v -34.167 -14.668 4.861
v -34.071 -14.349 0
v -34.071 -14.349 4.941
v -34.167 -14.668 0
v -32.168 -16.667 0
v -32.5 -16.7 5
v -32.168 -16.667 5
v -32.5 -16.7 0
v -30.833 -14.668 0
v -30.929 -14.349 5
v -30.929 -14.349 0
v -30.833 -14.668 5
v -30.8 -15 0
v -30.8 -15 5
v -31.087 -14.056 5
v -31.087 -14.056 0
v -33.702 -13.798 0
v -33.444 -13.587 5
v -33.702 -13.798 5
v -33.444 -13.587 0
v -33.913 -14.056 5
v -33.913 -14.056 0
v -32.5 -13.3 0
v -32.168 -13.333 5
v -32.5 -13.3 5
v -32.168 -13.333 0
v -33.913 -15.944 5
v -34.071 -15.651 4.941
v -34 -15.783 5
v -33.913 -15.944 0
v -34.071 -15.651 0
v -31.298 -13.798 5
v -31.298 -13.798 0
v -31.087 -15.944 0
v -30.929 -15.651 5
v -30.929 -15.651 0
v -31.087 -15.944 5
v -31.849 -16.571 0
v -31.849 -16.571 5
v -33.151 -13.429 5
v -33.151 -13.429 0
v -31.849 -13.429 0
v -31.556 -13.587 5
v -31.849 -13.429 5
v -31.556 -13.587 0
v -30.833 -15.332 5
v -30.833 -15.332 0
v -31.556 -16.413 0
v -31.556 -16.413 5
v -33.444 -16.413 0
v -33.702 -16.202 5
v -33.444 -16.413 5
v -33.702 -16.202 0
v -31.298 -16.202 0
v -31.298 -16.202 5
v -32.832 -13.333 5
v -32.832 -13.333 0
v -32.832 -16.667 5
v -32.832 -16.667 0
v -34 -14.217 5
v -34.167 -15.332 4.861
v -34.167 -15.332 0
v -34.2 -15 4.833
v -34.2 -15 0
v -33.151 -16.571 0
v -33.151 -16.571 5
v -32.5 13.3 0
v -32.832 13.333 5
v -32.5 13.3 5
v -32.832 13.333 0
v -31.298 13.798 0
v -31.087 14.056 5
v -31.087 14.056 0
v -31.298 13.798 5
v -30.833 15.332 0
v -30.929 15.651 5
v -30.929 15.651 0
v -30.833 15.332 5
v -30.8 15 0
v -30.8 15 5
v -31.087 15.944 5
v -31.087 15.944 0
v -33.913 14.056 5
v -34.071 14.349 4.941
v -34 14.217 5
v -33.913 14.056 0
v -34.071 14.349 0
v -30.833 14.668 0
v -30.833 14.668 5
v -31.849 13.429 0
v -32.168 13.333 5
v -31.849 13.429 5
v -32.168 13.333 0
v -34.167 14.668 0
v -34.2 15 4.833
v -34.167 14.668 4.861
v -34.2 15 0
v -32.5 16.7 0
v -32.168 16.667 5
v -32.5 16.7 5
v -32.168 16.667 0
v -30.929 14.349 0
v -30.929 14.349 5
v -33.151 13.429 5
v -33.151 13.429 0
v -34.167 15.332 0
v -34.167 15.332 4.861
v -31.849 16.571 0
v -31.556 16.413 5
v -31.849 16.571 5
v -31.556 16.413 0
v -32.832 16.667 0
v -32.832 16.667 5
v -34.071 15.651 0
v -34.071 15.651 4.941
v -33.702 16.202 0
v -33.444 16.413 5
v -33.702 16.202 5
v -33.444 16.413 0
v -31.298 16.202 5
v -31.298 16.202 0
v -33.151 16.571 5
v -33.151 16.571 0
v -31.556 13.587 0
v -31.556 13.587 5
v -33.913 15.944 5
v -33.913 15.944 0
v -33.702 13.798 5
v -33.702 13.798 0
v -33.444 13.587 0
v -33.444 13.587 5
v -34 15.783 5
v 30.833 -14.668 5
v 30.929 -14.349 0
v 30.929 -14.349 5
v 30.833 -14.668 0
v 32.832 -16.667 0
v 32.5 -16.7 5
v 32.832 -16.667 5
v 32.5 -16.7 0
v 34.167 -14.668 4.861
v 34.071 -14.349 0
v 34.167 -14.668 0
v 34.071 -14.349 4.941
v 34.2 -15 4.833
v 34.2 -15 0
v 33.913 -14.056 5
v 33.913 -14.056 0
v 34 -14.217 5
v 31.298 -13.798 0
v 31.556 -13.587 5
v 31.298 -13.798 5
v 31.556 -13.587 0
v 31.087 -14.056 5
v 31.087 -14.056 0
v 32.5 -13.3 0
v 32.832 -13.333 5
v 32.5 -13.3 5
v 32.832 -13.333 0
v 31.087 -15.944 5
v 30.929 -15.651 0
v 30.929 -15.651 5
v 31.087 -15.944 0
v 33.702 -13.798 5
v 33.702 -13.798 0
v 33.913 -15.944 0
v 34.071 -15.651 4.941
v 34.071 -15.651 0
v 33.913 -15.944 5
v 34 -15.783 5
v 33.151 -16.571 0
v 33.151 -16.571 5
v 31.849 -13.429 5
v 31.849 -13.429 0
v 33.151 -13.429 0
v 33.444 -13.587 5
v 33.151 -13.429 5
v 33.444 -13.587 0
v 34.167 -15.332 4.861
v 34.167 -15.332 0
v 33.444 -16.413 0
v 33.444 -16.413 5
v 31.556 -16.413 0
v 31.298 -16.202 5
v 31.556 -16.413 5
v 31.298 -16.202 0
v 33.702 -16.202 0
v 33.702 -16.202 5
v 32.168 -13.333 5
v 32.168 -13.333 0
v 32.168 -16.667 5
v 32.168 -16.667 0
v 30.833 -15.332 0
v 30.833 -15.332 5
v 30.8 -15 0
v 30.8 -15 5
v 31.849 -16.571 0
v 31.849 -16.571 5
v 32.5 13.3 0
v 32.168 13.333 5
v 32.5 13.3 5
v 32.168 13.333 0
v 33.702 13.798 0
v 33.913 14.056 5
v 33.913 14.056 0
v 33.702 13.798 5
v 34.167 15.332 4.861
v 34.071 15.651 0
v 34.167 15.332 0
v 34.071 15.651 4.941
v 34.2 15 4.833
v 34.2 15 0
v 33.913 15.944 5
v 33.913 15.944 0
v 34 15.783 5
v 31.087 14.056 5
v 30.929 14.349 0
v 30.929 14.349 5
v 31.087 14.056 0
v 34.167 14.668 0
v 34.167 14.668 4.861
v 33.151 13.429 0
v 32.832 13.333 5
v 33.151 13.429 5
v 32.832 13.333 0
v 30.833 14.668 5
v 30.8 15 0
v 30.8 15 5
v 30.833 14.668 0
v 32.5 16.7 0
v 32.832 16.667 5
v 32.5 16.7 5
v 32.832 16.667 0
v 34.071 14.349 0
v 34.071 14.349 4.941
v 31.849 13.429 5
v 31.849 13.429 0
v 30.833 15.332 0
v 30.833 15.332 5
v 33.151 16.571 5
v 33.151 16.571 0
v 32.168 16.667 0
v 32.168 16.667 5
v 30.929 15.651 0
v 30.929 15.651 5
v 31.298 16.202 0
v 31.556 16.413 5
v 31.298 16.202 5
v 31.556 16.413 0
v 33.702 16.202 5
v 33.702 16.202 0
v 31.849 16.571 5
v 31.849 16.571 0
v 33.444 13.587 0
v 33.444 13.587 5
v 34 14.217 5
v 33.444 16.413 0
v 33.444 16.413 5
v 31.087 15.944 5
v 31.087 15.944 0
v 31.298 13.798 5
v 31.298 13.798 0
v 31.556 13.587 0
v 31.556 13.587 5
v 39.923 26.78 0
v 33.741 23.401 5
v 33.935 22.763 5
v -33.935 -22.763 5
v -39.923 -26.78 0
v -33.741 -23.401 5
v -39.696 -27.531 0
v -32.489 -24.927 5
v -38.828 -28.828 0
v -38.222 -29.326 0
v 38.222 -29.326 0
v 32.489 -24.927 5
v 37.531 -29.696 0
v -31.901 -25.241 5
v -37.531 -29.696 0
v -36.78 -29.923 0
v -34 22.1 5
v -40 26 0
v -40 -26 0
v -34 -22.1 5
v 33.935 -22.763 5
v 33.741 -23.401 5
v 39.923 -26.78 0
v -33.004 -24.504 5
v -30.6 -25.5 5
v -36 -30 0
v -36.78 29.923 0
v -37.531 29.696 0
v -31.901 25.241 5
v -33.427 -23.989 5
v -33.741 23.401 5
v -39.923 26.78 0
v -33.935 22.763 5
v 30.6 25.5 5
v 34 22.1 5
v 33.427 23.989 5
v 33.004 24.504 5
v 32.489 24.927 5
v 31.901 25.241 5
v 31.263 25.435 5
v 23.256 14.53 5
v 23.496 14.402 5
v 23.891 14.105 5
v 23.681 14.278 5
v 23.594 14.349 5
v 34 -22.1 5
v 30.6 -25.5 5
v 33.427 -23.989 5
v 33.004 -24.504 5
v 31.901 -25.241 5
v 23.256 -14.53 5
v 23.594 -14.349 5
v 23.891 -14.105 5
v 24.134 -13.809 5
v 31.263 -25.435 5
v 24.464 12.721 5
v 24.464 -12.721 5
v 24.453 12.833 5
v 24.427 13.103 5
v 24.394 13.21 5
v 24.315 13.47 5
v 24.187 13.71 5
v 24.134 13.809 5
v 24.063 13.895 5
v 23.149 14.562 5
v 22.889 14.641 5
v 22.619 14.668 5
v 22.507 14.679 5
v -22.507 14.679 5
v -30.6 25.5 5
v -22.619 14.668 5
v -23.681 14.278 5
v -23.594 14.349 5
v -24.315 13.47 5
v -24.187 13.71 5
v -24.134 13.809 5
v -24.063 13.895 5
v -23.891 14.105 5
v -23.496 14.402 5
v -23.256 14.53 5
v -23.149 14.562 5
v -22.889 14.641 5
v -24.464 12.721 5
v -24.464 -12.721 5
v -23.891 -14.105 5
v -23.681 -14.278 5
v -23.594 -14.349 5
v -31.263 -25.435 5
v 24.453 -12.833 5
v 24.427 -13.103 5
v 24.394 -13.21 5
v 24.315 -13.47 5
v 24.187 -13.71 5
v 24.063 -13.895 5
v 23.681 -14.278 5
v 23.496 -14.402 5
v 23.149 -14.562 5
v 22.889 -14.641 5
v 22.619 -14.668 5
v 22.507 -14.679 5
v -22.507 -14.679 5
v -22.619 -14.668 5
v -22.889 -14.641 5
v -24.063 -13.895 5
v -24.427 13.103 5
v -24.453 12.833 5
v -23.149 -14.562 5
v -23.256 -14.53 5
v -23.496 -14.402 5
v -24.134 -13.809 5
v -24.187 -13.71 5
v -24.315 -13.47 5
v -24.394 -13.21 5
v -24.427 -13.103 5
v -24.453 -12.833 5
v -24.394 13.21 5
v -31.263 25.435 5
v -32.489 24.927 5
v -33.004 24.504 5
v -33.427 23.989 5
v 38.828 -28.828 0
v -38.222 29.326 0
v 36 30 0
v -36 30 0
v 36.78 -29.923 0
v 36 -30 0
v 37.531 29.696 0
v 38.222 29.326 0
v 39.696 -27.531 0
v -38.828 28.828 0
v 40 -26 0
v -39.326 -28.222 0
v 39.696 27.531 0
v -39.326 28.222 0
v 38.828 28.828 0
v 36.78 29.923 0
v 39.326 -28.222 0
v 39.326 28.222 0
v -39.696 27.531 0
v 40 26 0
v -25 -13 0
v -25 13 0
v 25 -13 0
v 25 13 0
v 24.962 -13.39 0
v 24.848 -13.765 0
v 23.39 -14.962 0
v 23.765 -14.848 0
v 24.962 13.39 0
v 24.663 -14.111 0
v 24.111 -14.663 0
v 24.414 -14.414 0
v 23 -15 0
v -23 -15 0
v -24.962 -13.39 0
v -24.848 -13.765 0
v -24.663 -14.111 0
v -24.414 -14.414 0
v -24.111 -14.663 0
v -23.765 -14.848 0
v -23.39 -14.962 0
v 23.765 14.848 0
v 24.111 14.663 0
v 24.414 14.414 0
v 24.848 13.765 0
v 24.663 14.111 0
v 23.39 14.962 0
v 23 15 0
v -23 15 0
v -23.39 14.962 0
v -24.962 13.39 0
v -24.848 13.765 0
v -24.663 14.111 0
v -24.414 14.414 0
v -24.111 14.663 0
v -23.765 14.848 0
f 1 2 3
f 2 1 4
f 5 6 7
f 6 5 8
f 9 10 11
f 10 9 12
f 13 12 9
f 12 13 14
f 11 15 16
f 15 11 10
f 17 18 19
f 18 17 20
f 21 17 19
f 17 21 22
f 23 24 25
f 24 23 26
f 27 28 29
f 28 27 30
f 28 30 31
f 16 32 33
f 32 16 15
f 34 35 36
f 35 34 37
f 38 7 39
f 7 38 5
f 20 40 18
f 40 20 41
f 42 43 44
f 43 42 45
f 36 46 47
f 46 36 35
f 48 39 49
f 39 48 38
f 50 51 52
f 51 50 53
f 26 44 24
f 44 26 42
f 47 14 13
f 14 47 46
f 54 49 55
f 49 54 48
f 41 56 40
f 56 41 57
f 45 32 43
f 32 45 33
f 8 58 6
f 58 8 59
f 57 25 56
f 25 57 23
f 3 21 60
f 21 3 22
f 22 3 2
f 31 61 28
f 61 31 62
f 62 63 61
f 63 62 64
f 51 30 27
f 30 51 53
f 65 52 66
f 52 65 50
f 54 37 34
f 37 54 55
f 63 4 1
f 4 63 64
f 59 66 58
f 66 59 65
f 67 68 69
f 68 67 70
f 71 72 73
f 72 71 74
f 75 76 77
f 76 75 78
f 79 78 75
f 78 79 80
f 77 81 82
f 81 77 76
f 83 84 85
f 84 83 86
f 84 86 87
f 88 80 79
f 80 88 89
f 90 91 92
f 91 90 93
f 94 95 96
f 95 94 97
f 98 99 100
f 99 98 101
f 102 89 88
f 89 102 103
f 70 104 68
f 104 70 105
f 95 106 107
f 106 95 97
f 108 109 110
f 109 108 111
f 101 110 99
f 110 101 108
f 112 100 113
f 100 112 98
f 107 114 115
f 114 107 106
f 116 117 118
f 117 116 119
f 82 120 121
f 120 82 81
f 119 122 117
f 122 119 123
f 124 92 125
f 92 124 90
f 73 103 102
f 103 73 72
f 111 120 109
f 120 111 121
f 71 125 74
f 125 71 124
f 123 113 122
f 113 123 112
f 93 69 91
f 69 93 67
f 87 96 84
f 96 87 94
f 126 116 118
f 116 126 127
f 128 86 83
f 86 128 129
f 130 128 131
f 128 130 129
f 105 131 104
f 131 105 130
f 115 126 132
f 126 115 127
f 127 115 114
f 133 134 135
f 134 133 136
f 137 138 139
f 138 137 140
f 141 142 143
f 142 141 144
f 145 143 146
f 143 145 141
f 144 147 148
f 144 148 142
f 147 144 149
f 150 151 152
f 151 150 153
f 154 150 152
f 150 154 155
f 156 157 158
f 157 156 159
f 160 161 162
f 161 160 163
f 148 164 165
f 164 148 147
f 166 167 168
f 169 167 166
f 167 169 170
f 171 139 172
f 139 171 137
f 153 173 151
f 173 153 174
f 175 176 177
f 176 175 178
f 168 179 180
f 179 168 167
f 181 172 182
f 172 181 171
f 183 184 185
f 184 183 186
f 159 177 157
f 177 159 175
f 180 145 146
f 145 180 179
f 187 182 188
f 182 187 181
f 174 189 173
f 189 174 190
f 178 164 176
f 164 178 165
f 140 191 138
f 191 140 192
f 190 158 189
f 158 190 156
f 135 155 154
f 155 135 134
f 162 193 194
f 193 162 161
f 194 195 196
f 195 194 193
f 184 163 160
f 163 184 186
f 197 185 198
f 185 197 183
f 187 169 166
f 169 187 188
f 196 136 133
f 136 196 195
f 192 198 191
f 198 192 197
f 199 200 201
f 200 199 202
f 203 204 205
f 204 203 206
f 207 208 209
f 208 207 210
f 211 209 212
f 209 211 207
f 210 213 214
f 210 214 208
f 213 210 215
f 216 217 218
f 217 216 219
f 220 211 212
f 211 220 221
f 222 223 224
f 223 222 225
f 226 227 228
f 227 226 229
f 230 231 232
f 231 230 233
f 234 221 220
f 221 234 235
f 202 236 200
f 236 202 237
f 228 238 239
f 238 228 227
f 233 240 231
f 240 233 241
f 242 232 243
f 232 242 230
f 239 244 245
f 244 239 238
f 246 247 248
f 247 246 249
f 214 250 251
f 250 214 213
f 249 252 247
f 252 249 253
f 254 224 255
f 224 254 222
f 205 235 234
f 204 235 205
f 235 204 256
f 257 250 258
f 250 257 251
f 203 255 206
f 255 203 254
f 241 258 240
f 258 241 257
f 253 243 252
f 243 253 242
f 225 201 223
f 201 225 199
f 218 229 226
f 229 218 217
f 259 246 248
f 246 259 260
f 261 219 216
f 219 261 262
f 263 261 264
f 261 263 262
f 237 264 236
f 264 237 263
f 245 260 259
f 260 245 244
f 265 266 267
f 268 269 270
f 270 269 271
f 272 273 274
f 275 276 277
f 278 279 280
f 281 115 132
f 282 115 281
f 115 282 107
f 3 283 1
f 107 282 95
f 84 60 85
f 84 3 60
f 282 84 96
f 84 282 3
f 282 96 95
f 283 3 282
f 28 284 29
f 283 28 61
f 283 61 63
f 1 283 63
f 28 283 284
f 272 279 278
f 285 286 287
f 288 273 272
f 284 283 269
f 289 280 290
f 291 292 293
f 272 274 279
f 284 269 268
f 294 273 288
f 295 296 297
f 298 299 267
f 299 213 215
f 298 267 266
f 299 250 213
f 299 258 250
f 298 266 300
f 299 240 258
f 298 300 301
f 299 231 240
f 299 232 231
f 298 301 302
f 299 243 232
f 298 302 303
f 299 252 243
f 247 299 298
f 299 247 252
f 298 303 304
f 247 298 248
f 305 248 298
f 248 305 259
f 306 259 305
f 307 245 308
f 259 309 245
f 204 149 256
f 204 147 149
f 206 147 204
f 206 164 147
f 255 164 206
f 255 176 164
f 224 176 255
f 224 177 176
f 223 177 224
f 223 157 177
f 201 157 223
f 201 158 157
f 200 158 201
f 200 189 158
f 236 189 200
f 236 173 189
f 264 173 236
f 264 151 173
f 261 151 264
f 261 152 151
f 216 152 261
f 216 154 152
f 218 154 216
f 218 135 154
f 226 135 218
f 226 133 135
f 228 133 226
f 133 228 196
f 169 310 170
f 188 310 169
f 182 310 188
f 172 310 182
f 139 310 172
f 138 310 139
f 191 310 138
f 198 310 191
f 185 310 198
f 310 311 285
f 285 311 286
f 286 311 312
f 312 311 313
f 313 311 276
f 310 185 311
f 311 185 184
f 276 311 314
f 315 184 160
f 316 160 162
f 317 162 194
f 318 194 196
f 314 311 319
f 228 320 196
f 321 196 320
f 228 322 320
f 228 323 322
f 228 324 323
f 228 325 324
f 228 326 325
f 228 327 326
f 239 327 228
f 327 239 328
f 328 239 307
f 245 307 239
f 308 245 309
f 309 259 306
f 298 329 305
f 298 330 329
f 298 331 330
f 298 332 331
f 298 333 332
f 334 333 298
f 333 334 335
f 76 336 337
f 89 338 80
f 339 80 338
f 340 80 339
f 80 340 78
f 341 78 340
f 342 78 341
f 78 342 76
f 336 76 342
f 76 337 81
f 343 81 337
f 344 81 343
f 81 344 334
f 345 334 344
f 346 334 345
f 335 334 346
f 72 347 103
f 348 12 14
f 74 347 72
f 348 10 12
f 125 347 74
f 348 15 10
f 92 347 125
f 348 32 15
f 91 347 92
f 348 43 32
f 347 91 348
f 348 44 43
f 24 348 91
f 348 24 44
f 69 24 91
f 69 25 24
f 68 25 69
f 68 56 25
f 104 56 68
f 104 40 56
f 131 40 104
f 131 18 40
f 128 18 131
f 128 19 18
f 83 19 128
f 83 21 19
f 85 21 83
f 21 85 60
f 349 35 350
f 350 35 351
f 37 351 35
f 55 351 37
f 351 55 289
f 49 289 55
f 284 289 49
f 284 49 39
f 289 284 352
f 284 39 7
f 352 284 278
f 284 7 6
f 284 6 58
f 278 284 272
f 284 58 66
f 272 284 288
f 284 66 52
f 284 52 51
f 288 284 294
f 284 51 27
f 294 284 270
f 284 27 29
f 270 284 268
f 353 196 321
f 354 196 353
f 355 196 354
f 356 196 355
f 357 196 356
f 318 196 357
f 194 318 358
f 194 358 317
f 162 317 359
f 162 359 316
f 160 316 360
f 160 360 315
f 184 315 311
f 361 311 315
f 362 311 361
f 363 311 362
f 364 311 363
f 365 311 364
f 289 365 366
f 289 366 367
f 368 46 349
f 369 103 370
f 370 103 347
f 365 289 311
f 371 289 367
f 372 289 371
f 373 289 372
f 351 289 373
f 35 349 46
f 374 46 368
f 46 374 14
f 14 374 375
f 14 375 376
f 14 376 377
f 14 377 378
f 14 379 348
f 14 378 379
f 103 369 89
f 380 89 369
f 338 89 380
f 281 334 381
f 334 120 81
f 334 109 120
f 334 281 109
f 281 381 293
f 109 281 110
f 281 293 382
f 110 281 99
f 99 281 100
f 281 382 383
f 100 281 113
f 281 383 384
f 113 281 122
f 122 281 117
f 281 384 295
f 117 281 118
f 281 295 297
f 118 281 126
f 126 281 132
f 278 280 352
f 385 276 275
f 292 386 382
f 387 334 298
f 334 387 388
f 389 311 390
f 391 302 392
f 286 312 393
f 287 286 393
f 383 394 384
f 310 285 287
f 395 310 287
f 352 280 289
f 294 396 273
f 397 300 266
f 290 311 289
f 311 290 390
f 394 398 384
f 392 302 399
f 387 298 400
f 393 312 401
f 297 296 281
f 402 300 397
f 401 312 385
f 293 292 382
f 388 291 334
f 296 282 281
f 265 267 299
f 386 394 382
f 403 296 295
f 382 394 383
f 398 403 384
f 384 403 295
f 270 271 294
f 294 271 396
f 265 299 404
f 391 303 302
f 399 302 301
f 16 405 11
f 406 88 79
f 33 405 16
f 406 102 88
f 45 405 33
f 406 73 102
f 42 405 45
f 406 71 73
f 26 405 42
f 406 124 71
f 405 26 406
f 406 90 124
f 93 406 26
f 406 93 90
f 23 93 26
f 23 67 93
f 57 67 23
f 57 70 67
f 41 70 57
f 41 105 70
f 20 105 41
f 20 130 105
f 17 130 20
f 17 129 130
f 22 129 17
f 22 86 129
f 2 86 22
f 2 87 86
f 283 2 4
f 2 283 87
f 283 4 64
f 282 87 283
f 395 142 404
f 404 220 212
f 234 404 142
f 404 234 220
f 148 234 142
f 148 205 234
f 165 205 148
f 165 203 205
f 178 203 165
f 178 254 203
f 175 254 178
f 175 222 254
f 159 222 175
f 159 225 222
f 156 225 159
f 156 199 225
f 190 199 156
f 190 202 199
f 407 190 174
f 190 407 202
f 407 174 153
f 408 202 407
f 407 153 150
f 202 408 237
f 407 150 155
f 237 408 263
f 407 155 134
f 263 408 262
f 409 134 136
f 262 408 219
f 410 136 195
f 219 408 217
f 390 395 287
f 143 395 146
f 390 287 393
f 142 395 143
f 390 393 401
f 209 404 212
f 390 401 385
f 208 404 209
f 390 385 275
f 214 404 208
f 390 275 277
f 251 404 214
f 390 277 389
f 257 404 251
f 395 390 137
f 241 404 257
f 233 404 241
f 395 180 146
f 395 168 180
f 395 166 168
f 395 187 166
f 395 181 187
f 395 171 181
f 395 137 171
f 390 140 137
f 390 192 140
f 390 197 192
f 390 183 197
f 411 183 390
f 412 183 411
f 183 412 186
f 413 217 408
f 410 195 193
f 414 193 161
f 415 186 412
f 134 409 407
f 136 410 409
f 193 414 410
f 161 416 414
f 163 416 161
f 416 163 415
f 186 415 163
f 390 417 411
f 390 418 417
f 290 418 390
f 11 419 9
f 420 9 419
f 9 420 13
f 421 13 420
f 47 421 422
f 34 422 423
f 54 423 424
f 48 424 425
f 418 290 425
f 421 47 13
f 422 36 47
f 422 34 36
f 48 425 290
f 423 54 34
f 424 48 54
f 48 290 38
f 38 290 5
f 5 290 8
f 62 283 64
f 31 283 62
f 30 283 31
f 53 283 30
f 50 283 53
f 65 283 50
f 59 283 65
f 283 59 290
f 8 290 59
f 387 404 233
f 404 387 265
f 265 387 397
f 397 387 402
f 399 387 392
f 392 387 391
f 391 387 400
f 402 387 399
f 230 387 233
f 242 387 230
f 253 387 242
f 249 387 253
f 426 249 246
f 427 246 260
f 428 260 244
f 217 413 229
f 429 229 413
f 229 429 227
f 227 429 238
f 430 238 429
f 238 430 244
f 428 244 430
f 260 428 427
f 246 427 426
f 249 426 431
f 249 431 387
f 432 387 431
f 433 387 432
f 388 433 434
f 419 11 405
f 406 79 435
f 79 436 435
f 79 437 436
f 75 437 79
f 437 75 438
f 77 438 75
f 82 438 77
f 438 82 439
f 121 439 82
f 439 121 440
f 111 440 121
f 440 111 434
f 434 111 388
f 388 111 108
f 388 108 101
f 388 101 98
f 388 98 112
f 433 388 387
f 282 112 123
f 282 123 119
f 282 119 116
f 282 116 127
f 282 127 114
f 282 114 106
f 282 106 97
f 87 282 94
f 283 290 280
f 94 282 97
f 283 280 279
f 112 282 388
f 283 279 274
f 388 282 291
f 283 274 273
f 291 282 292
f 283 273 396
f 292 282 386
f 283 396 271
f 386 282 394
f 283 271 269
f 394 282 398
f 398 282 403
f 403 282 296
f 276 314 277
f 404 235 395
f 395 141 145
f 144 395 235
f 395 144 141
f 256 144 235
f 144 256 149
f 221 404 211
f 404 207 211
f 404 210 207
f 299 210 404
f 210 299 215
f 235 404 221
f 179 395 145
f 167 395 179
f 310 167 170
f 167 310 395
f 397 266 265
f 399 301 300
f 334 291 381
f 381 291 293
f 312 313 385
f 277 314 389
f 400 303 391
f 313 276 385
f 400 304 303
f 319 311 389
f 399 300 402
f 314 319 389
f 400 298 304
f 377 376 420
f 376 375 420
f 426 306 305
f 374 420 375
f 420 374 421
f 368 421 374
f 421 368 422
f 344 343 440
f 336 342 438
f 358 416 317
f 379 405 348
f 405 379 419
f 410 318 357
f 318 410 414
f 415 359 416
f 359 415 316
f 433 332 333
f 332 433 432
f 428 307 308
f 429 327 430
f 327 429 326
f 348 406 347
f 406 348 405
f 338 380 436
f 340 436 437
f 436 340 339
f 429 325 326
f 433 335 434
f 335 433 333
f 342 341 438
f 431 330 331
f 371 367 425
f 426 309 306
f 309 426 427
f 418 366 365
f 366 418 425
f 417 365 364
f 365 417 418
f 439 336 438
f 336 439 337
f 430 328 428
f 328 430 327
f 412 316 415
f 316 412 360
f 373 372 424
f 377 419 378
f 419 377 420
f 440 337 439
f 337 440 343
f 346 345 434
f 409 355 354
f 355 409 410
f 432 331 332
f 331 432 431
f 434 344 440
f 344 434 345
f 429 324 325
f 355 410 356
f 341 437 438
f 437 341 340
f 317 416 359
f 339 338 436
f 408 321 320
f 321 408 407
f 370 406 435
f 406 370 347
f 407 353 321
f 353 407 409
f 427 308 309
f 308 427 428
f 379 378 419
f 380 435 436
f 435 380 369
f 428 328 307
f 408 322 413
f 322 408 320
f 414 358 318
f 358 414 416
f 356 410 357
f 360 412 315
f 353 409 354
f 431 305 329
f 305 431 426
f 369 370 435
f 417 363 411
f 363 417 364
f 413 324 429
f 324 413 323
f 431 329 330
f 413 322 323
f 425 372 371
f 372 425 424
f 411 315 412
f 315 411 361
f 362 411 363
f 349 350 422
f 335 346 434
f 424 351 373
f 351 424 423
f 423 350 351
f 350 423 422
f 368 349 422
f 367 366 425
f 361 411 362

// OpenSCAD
$fn = 32;

// ----------------------------------------------------------------------
// Display bezel: 80 x 60 mm frame, opening 50x30 mm
// ----------------------------------------------------------------------

// --- parameters (mm) ---
length = 80;              // frame outside length, X
width = 60;               // frame outside width, Y
frame_w = 15;             // frame width
thickness = 5;            // frame thickness
corner_r = 4;             // outside corner radius
chamfer = 0.85;           // outer wall taper
funnel = 0.97;            // inner opening taper
opening_l = 50;           // opening length
opening_w = 30;           // opening width
inner_r = 2;              // opening corner radius
hole_d = 3.4;             // mounting screw clearance
holes_per_side = 2;       // holes per short side
hole_inset = 7.5;         // hole centre inset from the outside edge

/* rounded-rectangle outlines, generated with loops */
module rounded_ring(l_nom, w_nom, r) {
  hull() {
    for (sx = [-1, 1]) for (sy = [-1, 1])
      translate([sx * (l_nom / 2 - r), sy * (w_nom / 2 - r)]) circle(r = r);
  }
}

difference() {
  /* frame body, drafted so the outer edge is a variable-depth chamfer */
  linear_extrude(height = thickness, scale = chamfer)
    rounded_ring(length, width, corner_r);
  /* viewing opening, drafted the other way for a funnel edge */
  linear_extrude(height = thickness + 2, scale = funnel)
    translate([0, 0, -1]) rounded_ring(opening_l, opening_w, inner_r);
  /* mounting screws through the frame lands */
  for (sx = [-1, 1]) for (i = [1 : holes_per_side])
    translate([sx * (length / 2 - hole_inset),
               (i - (holes_per_side + 1) / 2) * width * 0.5, -1])
      cylinder(h = thickness + 2, d = hole_d);
}
